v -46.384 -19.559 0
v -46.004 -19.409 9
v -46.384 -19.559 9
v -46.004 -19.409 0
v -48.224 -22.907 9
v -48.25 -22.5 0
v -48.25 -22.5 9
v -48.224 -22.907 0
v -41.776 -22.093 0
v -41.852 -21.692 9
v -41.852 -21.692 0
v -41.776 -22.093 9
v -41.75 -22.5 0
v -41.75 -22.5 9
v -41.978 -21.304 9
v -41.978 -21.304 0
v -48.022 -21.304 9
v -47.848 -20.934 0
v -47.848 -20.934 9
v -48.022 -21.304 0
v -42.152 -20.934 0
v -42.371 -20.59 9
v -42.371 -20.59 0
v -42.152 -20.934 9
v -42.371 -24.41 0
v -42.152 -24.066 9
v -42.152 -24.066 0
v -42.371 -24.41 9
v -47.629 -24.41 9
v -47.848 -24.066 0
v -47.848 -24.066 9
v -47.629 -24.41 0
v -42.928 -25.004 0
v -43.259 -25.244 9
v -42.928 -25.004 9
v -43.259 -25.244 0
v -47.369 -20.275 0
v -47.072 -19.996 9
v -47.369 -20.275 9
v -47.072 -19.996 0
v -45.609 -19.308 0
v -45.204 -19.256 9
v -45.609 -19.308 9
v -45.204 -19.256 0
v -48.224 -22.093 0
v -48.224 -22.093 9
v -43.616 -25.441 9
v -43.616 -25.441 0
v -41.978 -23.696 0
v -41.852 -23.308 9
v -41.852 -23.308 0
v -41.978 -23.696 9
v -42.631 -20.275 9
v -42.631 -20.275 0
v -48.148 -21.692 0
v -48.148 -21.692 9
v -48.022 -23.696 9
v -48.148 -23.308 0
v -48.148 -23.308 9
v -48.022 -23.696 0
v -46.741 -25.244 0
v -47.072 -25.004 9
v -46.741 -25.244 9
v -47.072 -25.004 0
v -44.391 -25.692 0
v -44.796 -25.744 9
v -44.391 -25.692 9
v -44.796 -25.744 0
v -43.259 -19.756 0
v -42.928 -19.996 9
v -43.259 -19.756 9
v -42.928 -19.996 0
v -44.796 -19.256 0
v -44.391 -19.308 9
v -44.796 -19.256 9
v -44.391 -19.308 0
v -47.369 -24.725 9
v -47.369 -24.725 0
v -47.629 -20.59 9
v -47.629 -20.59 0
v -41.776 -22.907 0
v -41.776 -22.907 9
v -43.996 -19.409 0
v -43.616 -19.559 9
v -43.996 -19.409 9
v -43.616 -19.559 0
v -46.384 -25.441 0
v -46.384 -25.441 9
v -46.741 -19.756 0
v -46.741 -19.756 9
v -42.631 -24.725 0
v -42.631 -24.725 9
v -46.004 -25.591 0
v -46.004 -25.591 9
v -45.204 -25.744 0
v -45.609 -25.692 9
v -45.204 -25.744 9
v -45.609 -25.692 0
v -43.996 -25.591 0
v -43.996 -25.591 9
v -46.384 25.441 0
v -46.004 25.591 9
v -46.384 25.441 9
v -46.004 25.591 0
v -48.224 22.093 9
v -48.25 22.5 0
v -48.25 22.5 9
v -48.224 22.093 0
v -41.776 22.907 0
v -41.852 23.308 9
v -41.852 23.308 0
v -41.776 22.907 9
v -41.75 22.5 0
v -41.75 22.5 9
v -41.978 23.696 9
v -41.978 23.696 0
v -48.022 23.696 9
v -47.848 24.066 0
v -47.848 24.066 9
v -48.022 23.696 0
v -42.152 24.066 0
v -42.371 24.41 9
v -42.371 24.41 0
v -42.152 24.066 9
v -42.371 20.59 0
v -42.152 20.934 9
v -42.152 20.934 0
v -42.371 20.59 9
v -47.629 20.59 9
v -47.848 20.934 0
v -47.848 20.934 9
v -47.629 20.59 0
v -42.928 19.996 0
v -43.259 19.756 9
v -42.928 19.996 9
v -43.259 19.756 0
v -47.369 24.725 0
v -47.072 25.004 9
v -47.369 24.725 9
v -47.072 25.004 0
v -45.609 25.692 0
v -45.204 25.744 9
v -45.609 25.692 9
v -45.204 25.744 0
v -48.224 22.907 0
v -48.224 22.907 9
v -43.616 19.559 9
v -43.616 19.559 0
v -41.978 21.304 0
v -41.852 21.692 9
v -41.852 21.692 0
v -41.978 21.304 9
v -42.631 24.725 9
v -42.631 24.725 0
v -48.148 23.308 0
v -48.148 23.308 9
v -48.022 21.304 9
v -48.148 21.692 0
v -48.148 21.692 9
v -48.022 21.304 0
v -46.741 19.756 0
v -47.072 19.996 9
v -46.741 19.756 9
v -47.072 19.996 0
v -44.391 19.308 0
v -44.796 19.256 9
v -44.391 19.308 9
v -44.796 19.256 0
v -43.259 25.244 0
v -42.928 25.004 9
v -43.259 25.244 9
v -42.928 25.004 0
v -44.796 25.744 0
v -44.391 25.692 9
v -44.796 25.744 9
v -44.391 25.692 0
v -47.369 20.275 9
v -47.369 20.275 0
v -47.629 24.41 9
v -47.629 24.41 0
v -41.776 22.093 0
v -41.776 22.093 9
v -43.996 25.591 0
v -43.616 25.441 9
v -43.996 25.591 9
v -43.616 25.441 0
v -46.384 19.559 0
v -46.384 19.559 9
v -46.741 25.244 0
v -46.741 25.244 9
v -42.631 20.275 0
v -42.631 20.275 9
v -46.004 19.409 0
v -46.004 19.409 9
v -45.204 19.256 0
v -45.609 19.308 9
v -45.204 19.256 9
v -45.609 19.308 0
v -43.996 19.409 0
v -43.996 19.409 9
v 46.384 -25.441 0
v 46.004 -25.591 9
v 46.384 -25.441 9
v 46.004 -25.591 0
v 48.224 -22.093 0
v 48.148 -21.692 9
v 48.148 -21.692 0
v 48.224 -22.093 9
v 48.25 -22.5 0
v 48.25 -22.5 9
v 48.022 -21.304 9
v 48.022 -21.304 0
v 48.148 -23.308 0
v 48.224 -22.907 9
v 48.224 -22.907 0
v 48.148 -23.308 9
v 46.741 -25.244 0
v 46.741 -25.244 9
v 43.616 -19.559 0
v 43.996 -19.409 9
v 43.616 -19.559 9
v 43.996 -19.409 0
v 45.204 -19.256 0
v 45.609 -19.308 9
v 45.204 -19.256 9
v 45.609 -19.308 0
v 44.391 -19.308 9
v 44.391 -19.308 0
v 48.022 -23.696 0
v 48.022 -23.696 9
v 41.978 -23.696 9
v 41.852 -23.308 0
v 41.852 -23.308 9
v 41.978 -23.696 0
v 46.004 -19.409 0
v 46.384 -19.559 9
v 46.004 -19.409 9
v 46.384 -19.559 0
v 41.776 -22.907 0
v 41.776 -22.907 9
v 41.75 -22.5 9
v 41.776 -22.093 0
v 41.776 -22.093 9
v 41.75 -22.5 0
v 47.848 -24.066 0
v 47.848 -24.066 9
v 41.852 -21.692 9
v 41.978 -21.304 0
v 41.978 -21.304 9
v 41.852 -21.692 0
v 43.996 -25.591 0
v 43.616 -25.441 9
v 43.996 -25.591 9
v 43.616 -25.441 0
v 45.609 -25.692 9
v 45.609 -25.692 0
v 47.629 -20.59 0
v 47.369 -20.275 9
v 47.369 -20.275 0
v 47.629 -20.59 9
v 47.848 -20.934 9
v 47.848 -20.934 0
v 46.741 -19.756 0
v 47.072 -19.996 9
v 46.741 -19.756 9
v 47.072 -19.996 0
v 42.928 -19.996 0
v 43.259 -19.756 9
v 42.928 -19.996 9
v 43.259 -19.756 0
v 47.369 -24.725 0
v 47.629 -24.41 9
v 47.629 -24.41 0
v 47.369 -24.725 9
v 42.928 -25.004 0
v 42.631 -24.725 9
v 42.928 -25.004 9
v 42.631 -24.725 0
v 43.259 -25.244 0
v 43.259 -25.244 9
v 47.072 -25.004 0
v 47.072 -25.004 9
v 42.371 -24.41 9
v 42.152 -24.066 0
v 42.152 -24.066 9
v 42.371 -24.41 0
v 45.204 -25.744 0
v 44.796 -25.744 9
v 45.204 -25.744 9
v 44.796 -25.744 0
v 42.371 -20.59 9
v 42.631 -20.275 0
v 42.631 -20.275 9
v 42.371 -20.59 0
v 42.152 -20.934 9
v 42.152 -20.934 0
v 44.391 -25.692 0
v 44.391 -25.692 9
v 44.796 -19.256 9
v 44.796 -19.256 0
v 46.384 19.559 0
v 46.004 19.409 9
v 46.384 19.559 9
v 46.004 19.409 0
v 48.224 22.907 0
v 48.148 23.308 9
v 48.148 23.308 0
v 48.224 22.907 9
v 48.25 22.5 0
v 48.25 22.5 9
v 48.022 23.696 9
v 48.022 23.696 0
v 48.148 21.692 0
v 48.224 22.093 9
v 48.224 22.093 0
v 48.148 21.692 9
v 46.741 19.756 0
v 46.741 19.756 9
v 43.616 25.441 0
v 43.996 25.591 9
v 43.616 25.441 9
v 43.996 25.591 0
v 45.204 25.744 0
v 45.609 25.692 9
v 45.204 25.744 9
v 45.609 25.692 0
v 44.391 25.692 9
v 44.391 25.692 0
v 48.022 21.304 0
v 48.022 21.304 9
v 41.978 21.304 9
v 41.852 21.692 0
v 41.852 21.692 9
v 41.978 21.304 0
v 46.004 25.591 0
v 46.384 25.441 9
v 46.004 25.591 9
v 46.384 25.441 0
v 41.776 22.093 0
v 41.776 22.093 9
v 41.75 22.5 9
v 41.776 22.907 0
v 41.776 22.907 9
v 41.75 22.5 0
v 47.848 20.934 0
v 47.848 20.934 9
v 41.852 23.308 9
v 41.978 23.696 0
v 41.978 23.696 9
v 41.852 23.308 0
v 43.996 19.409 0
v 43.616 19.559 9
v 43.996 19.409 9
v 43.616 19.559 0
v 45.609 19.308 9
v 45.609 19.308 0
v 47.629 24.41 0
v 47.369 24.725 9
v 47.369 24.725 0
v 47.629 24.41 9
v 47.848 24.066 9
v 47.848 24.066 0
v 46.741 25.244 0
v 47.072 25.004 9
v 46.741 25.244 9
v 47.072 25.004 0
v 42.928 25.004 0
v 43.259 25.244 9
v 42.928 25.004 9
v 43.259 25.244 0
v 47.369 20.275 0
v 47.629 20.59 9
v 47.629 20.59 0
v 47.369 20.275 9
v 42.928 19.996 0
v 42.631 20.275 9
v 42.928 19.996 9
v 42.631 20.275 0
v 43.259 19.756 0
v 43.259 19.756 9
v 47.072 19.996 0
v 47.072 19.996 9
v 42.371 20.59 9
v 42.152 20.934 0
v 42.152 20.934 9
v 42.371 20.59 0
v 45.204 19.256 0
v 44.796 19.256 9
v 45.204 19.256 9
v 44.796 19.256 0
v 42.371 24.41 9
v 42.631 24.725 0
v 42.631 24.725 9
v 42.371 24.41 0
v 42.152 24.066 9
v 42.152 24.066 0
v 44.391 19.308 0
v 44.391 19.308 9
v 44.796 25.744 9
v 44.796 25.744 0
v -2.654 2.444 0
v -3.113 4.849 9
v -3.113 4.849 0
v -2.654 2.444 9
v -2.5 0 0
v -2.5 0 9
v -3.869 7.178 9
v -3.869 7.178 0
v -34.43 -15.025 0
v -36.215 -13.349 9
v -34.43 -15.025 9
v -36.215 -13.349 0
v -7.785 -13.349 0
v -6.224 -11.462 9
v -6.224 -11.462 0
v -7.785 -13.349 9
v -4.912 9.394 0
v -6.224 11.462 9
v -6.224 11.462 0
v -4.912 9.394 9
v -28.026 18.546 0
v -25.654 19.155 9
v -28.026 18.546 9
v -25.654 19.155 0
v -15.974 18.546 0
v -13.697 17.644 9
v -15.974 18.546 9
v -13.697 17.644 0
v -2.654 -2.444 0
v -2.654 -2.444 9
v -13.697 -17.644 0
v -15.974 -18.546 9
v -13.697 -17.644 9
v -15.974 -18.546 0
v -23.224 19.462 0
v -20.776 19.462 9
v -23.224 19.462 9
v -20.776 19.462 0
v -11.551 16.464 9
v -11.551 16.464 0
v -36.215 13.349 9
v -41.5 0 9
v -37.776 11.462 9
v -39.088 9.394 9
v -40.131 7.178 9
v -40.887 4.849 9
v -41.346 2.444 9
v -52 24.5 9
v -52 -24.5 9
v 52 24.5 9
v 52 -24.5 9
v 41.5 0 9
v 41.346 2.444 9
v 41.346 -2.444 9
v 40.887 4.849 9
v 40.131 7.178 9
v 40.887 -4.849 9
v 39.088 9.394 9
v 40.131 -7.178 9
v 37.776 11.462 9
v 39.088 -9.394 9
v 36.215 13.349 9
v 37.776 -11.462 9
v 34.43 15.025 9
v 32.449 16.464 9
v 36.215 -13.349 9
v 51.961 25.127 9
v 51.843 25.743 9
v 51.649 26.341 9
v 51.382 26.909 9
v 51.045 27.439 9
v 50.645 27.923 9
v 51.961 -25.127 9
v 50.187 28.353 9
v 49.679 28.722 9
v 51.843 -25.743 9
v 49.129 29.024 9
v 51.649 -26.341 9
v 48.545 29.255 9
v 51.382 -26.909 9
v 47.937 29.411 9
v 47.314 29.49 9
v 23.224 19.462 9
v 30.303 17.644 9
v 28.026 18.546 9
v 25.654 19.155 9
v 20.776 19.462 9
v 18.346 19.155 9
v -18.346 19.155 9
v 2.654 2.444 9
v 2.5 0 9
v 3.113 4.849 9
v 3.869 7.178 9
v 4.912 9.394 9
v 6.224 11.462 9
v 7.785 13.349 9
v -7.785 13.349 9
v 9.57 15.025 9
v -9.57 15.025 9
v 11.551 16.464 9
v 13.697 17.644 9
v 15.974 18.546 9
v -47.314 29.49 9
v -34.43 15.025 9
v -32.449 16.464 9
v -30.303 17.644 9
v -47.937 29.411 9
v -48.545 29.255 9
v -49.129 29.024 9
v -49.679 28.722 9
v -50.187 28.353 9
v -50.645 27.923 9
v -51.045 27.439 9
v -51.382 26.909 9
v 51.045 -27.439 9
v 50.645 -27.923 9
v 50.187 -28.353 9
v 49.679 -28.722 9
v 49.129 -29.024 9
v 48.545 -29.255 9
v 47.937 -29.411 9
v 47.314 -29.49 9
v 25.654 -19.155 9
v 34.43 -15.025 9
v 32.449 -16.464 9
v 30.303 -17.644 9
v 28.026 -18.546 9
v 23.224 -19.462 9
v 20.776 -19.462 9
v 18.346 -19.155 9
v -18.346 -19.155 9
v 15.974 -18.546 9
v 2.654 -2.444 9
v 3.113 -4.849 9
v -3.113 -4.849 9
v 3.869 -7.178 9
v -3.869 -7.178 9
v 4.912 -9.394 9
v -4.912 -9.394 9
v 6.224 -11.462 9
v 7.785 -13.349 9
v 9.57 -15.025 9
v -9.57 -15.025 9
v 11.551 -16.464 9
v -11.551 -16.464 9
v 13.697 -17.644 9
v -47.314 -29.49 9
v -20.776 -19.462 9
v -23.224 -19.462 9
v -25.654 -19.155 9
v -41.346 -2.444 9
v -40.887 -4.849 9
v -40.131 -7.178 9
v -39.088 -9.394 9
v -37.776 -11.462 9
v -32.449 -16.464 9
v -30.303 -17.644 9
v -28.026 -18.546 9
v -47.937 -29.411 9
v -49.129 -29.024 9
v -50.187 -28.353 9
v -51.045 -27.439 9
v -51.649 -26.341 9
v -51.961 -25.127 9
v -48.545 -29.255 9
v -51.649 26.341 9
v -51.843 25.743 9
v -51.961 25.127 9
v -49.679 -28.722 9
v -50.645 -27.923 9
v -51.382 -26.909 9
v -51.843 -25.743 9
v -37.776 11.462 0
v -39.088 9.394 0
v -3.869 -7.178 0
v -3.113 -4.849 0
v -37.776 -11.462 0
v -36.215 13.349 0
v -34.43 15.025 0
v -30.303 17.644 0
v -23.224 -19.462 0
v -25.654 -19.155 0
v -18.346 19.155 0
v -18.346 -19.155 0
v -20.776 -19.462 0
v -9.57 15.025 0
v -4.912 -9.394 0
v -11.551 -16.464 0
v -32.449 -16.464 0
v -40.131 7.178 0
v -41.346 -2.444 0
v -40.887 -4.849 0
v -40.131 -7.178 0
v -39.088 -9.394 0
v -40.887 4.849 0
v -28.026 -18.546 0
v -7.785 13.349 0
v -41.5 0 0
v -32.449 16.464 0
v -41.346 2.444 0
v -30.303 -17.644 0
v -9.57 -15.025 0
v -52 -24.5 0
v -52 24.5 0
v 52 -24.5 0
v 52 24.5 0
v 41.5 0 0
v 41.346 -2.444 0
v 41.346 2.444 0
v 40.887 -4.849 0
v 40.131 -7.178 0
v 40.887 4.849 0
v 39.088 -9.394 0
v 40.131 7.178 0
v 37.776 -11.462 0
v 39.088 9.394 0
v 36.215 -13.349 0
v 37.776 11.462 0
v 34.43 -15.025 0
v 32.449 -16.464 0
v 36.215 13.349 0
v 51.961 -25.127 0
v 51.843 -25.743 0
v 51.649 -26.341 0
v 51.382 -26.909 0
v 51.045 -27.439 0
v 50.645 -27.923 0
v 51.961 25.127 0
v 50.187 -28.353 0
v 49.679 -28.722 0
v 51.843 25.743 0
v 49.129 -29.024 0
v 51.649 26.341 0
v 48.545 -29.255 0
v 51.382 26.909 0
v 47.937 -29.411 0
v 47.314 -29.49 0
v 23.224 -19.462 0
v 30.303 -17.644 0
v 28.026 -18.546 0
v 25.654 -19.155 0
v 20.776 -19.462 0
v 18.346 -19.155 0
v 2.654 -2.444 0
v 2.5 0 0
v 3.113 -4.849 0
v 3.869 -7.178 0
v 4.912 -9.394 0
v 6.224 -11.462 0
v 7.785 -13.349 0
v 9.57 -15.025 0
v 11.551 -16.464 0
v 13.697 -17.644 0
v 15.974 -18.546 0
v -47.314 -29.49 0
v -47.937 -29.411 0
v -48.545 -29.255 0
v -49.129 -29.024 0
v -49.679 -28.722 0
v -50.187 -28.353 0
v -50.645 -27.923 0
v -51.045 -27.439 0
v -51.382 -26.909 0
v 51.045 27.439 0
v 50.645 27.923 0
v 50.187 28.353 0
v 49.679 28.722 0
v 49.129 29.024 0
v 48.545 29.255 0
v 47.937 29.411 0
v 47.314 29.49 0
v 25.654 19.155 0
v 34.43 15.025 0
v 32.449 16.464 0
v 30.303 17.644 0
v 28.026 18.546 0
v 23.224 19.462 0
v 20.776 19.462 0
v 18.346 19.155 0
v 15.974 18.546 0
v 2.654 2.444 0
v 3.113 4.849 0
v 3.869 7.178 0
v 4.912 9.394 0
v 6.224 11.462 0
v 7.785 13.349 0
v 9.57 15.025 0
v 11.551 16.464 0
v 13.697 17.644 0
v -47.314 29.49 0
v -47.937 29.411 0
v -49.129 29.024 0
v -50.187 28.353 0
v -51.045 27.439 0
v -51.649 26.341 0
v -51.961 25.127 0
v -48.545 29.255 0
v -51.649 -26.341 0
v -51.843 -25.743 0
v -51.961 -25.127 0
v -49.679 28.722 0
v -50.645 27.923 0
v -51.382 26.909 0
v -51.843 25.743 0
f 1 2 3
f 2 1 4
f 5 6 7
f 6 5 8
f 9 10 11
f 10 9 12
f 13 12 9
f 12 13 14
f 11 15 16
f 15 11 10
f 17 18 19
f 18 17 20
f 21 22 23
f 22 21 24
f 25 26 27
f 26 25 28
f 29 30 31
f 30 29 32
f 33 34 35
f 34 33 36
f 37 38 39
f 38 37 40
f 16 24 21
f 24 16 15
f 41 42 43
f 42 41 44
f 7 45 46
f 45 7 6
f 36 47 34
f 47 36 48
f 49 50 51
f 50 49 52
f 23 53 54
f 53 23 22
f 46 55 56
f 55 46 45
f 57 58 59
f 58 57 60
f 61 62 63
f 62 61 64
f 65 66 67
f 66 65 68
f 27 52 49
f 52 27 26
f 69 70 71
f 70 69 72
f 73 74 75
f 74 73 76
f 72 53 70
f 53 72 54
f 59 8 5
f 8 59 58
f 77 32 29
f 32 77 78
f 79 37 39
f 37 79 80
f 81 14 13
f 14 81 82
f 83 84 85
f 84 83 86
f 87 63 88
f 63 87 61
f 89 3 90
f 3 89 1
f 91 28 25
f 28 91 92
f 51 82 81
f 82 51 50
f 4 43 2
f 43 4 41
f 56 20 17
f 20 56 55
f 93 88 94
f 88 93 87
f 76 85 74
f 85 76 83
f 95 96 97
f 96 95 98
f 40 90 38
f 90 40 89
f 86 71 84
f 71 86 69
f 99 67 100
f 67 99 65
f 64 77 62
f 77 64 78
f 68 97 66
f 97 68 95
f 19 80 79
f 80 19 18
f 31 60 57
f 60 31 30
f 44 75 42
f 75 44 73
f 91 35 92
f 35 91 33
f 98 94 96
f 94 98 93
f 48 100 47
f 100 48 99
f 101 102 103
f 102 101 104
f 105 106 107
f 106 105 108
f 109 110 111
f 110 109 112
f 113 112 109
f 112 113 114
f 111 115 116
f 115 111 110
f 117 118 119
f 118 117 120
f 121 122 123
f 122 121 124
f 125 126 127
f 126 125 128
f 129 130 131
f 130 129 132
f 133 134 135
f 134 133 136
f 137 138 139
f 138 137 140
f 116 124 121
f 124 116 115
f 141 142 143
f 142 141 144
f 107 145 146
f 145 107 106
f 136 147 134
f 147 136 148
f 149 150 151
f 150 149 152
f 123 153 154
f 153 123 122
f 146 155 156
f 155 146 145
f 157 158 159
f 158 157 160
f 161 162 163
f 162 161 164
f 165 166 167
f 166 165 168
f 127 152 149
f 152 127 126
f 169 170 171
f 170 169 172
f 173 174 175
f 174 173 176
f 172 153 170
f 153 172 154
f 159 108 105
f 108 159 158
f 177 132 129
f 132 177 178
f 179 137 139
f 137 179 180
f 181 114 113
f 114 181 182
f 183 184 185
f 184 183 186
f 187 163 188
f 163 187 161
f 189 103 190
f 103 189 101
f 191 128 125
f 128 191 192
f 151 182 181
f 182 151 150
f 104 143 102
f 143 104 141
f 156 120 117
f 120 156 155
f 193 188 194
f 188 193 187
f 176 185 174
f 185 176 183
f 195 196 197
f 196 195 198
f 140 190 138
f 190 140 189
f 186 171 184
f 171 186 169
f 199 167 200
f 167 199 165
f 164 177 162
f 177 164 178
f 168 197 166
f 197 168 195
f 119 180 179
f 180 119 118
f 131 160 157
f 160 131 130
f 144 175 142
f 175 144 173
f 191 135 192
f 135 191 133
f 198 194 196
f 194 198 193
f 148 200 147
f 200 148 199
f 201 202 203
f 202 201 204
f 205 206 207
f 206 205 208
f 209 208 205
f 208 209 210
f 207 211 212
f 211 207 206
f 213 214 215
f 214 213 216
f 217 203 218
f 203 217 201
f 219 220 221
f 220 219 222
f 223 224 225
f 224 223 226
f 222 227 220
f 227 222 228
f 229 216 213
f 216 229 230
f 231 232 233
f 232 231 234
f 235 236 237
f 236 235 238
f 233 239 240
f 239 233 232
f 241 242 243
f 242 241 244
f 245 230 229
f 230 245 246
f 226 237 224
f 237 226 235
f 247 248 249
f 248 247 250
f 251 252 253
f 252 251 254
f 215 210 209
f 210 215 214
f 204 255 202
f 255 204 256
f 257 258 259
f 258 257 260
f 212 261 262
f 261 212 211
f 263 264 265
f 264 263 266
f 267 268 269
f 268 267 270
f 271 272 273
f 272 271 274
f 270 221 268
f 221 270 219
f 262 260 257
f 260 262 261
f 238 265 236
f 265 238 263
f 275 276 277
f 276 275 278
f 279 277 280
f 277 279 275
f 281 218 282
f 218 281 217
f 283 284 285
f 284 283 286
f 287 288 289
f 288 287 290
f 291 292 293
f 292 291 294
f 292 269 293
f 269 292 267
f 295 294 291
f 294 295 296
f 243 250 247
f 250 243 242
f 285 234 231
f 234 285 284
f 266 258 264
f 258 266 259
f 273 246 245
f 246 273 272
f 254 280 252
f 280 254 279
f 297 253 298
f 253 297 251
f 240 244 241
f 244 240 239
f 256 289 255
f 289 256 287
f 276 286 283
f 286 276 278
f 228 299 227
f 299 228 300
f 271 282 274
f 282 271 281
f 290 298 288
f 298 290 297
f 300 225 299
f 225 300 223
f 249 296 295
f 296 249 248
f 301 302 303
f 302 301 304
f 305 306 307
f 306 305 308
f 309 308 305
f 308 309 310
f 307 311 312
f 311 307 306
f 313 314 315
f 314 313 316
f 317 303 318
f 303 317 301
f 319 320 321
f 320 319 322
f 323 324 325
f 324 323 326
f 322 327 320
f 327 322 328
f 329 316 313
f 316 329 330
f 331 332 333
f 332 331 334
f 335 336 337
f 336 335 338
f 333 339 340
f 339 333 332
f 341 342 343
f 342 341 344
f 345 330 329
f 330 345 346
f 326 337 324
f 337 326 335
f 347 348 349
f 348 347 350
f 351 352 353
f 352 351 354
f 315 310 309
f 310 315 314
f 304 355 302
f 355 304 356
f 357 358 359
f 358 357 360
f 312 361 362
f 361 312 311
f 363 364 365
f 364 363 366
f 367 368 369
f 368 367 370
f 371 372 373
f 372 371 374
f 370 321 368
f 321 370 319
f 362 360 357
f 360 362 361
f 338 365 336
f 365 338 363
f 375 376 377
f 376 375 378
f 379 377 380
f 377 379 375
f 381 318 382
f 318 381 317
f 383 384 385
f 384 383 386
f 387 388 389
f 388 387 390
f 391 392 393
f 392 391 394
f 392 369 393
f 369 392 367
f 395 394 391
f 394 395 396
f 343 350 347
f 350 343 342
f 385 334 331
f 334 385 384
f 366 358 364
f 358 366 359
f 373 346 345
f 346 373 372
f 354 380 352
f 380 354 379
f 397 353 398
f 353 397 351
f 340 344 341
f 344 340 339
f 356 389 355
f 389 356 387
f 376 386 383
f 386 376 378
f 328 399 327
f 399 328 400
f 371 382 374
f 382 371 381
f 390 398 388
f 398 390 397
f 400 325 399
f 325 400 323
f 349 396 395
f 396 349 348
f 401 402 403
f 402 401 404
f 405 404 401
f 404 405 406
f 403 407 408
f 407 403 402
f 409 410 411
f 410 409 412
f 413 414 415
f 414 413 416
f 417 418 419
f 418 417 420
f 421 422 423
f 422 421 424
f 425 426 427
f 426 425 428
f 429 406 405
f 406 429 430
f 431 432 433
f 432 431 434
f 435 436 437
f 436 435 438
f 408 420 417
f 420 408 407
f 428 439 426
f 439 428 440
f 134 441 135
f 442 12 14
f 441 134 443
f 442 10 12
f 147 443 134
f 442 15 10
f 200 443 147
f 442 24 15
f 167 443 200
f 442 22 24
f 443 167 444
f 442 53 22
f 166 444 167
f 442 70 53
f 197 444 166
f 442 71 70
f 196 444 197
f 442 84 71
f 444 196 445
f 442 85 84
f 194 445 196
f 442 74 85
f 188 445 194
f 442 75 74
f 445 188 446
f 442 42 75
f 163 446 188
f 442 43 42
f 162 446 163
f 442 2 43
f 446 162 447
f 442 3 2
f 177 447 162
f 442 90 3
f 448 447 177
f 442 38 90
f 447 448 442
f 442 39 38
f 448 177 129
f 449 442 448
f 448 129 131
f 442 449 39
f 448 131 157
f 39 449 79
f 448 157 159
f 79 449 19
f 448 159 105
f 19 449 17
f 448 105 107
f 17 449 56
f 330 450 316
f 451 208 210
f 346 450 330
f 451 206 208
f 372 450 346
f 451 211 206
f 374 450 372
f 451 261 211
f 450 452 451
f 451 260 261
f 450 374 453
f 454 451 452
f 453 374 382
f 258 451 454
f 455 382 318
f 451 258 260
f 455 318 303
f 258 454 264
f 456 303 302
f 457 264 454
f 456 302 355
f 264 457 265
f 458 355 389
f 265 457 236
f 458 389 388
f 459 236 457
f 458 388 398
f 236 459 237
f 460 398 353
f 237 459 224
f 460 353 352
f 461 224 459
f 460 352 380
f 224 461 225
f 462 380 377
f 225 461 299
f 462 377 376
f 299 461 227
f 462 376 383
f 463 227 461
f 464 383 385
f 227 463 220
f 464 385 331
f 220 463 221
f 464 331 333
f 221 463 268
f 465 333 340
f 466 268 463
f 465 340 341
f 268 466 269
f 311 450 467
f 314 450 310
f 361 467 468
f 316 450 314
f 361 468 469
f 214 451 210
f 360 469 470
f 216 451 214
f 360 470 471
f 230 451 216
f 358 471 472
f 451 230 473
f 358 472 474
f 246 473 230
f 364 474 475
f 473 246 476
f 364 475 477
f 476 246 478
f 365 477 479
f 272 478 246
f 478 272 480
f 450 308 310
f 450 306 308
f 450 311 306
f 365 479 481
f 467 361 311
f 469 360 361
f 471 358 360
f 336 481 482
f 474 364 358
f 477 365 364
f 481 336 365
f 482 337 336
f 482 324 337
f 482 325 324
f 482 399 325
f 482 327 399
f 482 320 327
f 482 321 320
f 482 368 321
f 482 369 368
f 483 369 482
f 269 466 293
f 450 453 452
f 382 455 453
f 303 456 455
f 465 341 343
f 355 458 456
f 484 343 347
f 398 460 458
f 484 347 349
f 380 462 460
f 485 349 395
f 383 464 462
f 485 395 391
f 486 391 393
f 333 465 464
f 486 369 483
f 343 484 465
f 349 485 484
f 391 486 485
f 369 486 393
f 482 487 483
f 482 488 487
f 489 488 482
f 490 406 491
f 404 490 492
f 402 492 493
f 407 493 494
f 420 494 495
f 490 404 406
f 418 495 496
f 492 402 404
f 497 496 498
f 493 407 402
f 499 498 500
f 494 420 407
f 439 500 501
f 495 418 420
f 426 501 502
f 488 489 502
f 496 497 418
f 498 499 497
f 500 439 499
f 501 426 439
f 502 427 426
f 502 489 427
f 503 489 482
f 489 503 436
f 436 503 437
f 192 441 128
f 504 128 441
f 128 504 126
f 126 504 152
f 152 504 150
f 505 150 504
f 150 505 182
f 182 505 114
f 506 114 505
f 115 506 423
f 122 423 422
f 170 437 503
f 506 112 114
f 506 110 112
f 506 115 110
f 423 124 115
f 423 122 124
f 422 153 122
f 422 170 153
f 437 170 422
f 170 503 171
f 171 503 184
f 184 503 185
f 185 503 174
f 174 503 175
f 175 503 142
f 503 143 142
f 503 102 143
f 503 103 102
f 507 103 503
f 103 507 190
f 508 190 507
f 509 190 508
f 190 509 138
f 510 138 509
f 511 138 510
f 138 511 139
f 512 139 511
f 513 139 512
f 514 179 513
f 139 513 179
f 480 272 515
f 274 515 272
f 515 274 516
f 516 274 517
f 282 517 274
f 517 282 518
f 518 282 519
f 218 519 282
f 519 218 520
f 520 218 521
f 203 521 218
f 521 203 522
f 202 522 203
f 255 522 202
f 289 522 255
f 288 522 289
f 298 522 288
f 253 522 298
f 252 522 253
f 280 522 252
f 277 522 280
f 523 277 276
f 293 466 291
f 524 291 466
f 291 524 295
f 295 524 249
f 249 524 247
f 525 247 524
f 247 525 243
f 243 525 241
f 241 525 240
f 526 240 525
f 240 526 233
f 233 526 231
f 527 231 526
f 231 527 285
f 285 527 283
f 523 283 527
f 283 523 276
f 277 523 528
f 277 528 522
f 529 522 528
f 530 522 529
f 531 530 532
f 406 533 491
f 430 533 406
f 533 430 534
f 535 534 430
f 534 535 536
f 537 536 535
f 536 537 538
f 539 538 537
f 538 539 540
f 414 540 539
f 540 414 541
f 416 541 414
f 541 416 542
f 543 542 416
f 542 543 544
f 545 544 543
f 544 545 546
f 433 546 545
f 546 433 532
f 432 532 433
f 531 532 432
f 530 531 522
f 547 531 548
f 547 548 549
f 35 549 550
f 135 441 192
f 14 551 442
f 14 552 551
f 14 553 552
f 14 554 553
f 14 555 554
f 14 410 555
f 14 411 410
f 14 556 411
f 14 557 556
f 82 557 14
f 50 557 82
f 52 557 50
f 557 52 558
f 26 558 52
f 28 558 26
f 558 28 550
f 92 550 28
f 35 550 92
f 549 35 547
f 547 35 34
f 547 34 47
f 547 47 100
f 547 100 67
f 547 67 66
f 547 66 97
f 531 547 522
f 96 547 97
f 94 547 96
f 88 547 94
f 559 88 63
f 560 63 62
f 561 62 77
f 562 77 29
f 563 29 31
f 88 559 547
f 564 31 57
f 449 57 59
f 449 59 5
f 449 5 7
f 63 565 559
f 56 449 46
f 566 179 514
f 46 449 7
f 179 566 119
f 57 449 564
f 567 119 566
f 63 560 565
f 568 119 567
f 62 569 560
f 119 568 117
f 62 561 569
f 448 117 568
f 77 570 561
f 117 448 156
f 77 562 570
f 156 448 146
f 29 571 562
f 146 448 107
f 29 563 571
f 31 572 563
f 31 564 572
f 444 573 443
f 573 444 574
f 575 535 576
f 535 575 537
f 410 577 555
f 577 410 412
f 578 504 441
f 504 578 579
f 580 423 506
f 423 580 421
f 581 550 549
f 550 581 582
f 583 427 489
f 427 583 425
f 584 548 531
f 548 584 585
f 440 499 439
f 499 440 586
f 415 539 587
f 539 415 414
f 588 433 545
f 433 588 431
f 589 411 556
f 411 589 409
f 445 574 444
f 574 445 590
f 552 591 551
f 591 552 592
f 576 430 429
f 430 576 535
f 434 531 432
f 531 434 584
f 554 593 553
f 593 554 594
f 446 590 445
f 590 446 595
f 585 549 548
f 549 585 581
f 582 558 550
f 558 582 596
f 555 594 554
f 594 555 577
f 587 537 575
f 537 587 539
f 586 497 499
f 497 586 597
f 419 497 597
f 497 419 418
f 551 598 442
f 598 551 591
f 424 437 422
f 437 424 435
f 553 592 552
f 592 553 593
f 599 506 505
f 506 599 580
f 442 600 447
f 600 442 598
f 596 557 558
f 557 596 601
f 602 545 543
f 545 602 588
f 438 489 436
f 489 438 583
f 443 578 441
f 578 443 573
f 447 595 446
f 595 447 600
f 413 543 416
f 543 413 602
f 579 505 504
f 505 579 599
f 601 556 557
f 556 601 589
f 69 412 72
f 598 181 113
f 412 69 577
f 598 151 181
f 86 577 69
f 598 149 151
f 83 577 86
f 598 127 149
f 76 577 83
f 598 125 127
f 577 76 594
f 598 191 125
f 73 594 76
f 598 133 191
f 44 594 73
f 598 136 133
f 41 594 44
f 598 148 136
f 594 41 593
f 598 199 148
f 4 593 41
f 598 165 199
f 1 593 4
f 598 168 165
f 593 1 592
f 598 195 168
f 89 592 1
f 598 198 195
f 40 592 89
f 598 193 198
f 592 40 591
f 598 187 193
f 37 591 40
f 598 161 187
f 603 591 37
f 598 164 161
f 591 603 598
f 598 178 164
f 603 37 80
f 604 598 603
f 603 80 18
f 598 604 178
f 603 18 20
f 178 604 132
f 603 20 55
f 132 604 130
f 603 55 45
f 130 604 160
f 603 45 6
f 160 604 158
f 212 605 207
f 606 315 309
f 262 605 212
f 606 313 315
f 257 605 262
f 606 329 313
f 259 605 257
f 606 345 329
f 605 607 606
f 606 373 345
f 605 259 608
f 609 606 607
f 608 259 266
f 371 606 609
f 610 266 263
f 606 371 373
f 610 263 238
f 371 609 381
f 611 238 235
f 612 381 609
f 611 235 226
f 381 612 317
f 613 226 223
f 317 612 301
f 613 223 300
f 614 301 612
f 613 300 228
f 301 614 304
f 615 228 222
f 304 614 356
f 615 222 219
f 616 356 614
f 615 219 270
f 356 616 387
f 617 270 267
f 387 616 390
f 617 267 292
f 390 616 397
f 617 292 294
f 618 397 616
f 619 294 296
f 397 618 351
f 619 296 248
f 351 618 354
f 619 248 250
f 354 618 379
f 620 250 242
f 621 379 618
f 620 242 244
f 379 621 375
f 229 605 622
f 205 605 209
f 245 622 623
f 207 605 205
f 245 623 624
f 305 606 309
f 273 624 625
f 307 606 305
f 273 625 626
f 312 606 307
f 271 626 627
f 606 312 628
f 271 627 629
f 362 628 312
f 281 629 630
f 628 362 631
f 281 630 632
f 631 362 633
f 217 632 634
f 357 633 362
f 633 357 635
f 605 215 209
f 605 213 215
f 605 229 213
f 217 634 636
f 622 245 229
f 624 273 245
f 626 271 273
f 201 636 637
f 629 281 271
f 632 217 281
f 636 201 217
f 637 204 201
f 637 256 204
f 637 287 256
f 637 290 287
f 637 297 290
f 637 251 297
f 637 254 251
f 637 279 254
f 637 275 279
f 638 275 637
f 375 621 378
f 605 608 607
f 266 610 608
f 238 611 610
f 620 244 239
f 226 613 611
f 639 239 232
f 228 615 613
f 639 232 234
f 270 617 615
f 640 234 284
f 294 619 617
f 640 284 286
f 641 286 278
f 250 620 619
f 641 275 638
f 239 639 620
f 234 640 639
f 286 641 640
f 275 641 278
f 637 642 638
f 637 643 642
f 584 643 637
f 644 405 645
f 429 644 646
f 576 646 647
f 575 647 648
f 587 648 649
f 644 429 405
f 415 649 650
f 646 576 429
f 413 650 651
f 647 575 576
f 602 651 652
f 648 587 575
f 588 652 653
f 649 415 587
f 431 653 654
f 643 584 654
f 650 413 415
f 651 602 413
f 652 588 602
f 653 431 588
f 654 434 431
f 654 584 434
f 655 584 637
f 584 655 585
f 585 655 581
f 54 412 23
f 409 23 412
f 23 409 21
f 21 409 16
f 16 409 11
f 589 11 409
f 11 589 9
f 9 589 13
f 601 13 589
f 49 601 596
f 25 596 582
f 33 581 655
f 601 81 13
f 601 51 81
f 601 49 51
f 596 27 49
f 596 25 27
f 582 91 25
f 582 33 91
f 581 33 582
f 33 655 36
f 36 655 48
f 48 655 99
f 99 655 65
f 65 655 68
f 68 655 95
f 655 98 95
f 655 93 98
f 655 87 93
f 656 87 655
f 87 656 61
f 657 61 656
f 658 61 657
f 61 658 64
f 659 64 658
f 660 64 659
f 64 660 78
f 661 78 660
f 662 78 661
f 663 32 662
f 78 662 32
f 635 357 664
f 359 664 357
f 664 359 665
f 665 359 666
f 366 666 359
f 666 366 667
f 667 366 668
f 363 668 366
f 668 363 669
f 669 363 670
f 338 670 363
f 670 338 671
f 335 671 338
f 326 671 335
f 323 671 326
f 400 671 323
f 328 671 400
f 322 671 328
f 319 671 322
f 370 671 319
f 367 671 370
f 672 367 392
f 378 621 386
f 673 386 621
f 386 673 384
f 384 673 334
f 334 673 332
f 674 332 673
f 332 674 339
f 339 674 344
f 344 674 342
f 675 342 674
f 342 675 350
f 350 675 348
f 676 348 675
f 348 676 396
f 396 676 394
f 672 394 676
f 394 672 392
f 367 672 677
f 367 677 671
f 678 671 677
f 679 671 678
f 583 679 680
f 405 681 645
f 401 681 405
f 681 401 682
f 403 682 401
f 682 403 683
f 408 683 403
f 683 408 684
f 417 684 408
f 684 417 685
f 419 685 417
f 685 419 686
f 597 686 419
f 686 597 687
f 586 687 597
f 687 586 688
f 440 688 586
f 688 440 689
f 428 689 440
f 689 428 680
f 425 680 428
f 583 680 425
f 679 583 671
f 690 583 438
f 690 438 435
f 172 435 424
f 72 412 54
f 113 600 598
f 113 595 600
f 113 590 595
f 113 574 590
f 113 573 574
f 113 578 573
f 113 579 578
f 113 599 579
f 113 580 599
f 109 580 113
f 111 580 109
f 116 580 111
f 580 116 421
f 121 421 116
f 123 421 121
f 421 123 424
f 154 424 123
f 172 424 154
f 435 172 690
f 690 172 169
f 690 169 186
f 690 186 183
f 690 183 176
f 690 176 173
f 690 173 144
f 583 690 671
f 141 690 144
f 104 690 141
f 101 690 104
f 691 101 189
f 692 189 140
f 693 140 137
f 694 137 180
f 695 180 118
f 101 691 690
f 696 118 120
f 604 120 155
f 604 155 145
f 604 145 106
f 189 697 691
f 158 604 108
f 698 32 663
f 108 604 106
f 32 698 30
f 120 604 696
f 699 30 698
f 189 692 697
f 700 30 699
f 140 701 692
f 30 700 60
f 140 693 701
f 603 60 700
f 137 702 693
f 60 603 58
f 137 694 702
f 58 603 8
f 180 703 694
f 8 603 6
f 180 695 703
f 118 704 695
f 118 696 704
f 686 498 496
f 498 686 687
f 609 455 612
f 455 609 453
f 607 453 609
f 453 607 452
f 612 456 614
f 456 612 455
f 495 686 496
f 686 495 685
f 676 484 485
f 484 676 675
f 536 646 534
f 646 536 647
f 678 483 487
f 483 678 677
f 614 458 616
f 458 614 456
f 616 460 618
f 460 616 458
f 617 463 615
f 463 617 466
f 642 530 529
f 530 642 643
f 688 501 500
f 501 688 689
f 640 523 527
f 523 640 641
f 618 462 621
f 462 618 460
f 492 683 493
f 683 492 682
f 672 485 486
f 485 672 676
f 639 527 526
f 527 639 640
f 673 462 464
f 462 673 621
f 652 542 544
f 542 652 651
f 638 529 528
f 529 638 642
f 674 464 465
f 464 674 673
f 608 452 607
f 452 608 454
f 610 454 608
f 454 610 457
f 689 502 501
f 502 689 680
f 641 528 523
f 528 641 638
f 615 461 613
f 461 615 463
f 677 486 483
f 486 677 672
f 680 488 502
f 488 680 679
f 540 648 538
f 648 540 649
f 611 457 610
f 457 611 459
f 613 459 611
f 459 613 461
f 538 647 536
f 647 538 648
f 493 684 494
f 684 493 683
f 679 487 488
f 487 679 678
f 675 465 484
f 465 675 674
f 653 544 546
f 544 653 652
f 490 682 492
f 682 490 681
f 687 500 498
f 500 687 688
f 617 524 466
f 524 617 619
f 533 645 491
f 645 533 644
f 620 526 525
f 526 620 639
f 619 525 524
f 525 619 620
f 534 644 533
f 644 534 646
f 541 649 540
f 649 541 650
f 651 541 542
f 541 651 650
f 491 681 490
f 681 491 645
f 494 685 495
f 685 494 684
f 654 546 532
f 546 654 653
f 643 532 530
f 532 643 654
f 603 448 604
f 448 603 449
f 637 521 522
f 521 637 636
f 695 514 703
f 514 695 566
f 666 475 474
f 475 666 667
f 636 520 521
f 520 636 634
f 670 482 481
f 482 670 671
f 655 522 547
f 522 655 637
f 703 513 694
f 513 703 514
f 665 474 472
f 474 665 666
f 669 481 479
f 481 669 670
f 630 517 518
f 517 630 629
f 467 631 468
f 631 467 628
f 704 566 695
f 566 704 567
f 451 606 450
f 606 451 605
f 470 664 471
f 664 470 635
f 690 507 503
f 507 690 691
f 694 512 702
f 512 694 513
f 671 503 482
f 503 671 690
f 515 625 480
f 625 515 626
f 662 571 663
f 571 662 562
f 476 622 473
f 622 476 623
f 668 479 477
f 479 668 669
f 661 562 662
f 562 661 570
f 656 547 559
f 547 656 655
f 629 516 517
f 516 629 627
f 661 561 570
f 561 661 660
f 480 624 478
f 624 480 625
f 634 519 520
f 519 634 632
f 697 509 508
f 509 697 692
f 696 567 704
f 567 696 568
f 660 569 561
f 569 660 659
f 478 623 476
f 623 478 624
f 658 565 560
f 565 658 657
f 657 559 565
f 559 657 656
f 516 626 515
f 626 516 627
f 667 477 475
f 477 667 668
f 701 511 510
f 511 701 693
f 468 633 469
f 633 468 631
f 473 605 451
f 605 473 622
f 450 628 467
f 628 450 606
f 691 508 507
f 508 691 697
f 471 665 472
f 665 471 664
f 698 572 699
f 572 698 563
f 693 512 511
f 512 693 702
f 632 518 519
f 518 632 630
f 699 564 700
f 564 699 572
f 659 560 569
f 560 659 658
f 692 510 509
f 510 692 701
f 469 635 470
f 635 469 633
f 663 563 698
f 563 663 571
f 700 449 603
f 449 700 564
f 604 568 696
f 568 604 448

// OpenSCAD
$fn = 50;


difference() {
	union() {
		hull() {
			translate(v = [-47.0000000000, 24.5000000000, 0]) {
				cylinder(h = 9, r = 5);
			}
			translate(v = [47.0000000000, 24.5000000000, 0]) {
				cylinder(h = 9, r = 5);
			}
			translate(v = [-47.0000000000, -24.5000000000, 0]) {
				cylinder(h = 9, r = 5);
			}
			translate(v = [47.0000000000, -24.5000000000, 0]) {
				cylinder(h = 9, r = 5);
			}
		}
	}
	union() {
		#translate(v = [-45.0000000000, -22.5000000000, -100.0000000000]) {
			cylinder(h = 200, r = 3.2500000000);
		}
		#translate(v = [-45.0000000000, 22.5000000000, -100.0000000000]) {
			cylinder(h = 200, r = 3.2500000000);
		}
		#translate(v = [45.0000000000, -22.5000000000, -100.0000000000]) {
			cylinder(h = 200, r = 3.2500000000);
		}
		#translate(v = [45.0000000000, 22.5000000000, -100.0000000000]) {
			cylinder(h = 200, r = 3.2500000000);
		}
		#translate(v = [-22.0000000000, 0, 0]) {
			cylinder(h = 9, r = 19.5000000000);
		}
		#translate(v = [22.0000000000, 0, 0]) {
			cylinder(h = 9, r = 19.5000000000);
		}
	}
}
